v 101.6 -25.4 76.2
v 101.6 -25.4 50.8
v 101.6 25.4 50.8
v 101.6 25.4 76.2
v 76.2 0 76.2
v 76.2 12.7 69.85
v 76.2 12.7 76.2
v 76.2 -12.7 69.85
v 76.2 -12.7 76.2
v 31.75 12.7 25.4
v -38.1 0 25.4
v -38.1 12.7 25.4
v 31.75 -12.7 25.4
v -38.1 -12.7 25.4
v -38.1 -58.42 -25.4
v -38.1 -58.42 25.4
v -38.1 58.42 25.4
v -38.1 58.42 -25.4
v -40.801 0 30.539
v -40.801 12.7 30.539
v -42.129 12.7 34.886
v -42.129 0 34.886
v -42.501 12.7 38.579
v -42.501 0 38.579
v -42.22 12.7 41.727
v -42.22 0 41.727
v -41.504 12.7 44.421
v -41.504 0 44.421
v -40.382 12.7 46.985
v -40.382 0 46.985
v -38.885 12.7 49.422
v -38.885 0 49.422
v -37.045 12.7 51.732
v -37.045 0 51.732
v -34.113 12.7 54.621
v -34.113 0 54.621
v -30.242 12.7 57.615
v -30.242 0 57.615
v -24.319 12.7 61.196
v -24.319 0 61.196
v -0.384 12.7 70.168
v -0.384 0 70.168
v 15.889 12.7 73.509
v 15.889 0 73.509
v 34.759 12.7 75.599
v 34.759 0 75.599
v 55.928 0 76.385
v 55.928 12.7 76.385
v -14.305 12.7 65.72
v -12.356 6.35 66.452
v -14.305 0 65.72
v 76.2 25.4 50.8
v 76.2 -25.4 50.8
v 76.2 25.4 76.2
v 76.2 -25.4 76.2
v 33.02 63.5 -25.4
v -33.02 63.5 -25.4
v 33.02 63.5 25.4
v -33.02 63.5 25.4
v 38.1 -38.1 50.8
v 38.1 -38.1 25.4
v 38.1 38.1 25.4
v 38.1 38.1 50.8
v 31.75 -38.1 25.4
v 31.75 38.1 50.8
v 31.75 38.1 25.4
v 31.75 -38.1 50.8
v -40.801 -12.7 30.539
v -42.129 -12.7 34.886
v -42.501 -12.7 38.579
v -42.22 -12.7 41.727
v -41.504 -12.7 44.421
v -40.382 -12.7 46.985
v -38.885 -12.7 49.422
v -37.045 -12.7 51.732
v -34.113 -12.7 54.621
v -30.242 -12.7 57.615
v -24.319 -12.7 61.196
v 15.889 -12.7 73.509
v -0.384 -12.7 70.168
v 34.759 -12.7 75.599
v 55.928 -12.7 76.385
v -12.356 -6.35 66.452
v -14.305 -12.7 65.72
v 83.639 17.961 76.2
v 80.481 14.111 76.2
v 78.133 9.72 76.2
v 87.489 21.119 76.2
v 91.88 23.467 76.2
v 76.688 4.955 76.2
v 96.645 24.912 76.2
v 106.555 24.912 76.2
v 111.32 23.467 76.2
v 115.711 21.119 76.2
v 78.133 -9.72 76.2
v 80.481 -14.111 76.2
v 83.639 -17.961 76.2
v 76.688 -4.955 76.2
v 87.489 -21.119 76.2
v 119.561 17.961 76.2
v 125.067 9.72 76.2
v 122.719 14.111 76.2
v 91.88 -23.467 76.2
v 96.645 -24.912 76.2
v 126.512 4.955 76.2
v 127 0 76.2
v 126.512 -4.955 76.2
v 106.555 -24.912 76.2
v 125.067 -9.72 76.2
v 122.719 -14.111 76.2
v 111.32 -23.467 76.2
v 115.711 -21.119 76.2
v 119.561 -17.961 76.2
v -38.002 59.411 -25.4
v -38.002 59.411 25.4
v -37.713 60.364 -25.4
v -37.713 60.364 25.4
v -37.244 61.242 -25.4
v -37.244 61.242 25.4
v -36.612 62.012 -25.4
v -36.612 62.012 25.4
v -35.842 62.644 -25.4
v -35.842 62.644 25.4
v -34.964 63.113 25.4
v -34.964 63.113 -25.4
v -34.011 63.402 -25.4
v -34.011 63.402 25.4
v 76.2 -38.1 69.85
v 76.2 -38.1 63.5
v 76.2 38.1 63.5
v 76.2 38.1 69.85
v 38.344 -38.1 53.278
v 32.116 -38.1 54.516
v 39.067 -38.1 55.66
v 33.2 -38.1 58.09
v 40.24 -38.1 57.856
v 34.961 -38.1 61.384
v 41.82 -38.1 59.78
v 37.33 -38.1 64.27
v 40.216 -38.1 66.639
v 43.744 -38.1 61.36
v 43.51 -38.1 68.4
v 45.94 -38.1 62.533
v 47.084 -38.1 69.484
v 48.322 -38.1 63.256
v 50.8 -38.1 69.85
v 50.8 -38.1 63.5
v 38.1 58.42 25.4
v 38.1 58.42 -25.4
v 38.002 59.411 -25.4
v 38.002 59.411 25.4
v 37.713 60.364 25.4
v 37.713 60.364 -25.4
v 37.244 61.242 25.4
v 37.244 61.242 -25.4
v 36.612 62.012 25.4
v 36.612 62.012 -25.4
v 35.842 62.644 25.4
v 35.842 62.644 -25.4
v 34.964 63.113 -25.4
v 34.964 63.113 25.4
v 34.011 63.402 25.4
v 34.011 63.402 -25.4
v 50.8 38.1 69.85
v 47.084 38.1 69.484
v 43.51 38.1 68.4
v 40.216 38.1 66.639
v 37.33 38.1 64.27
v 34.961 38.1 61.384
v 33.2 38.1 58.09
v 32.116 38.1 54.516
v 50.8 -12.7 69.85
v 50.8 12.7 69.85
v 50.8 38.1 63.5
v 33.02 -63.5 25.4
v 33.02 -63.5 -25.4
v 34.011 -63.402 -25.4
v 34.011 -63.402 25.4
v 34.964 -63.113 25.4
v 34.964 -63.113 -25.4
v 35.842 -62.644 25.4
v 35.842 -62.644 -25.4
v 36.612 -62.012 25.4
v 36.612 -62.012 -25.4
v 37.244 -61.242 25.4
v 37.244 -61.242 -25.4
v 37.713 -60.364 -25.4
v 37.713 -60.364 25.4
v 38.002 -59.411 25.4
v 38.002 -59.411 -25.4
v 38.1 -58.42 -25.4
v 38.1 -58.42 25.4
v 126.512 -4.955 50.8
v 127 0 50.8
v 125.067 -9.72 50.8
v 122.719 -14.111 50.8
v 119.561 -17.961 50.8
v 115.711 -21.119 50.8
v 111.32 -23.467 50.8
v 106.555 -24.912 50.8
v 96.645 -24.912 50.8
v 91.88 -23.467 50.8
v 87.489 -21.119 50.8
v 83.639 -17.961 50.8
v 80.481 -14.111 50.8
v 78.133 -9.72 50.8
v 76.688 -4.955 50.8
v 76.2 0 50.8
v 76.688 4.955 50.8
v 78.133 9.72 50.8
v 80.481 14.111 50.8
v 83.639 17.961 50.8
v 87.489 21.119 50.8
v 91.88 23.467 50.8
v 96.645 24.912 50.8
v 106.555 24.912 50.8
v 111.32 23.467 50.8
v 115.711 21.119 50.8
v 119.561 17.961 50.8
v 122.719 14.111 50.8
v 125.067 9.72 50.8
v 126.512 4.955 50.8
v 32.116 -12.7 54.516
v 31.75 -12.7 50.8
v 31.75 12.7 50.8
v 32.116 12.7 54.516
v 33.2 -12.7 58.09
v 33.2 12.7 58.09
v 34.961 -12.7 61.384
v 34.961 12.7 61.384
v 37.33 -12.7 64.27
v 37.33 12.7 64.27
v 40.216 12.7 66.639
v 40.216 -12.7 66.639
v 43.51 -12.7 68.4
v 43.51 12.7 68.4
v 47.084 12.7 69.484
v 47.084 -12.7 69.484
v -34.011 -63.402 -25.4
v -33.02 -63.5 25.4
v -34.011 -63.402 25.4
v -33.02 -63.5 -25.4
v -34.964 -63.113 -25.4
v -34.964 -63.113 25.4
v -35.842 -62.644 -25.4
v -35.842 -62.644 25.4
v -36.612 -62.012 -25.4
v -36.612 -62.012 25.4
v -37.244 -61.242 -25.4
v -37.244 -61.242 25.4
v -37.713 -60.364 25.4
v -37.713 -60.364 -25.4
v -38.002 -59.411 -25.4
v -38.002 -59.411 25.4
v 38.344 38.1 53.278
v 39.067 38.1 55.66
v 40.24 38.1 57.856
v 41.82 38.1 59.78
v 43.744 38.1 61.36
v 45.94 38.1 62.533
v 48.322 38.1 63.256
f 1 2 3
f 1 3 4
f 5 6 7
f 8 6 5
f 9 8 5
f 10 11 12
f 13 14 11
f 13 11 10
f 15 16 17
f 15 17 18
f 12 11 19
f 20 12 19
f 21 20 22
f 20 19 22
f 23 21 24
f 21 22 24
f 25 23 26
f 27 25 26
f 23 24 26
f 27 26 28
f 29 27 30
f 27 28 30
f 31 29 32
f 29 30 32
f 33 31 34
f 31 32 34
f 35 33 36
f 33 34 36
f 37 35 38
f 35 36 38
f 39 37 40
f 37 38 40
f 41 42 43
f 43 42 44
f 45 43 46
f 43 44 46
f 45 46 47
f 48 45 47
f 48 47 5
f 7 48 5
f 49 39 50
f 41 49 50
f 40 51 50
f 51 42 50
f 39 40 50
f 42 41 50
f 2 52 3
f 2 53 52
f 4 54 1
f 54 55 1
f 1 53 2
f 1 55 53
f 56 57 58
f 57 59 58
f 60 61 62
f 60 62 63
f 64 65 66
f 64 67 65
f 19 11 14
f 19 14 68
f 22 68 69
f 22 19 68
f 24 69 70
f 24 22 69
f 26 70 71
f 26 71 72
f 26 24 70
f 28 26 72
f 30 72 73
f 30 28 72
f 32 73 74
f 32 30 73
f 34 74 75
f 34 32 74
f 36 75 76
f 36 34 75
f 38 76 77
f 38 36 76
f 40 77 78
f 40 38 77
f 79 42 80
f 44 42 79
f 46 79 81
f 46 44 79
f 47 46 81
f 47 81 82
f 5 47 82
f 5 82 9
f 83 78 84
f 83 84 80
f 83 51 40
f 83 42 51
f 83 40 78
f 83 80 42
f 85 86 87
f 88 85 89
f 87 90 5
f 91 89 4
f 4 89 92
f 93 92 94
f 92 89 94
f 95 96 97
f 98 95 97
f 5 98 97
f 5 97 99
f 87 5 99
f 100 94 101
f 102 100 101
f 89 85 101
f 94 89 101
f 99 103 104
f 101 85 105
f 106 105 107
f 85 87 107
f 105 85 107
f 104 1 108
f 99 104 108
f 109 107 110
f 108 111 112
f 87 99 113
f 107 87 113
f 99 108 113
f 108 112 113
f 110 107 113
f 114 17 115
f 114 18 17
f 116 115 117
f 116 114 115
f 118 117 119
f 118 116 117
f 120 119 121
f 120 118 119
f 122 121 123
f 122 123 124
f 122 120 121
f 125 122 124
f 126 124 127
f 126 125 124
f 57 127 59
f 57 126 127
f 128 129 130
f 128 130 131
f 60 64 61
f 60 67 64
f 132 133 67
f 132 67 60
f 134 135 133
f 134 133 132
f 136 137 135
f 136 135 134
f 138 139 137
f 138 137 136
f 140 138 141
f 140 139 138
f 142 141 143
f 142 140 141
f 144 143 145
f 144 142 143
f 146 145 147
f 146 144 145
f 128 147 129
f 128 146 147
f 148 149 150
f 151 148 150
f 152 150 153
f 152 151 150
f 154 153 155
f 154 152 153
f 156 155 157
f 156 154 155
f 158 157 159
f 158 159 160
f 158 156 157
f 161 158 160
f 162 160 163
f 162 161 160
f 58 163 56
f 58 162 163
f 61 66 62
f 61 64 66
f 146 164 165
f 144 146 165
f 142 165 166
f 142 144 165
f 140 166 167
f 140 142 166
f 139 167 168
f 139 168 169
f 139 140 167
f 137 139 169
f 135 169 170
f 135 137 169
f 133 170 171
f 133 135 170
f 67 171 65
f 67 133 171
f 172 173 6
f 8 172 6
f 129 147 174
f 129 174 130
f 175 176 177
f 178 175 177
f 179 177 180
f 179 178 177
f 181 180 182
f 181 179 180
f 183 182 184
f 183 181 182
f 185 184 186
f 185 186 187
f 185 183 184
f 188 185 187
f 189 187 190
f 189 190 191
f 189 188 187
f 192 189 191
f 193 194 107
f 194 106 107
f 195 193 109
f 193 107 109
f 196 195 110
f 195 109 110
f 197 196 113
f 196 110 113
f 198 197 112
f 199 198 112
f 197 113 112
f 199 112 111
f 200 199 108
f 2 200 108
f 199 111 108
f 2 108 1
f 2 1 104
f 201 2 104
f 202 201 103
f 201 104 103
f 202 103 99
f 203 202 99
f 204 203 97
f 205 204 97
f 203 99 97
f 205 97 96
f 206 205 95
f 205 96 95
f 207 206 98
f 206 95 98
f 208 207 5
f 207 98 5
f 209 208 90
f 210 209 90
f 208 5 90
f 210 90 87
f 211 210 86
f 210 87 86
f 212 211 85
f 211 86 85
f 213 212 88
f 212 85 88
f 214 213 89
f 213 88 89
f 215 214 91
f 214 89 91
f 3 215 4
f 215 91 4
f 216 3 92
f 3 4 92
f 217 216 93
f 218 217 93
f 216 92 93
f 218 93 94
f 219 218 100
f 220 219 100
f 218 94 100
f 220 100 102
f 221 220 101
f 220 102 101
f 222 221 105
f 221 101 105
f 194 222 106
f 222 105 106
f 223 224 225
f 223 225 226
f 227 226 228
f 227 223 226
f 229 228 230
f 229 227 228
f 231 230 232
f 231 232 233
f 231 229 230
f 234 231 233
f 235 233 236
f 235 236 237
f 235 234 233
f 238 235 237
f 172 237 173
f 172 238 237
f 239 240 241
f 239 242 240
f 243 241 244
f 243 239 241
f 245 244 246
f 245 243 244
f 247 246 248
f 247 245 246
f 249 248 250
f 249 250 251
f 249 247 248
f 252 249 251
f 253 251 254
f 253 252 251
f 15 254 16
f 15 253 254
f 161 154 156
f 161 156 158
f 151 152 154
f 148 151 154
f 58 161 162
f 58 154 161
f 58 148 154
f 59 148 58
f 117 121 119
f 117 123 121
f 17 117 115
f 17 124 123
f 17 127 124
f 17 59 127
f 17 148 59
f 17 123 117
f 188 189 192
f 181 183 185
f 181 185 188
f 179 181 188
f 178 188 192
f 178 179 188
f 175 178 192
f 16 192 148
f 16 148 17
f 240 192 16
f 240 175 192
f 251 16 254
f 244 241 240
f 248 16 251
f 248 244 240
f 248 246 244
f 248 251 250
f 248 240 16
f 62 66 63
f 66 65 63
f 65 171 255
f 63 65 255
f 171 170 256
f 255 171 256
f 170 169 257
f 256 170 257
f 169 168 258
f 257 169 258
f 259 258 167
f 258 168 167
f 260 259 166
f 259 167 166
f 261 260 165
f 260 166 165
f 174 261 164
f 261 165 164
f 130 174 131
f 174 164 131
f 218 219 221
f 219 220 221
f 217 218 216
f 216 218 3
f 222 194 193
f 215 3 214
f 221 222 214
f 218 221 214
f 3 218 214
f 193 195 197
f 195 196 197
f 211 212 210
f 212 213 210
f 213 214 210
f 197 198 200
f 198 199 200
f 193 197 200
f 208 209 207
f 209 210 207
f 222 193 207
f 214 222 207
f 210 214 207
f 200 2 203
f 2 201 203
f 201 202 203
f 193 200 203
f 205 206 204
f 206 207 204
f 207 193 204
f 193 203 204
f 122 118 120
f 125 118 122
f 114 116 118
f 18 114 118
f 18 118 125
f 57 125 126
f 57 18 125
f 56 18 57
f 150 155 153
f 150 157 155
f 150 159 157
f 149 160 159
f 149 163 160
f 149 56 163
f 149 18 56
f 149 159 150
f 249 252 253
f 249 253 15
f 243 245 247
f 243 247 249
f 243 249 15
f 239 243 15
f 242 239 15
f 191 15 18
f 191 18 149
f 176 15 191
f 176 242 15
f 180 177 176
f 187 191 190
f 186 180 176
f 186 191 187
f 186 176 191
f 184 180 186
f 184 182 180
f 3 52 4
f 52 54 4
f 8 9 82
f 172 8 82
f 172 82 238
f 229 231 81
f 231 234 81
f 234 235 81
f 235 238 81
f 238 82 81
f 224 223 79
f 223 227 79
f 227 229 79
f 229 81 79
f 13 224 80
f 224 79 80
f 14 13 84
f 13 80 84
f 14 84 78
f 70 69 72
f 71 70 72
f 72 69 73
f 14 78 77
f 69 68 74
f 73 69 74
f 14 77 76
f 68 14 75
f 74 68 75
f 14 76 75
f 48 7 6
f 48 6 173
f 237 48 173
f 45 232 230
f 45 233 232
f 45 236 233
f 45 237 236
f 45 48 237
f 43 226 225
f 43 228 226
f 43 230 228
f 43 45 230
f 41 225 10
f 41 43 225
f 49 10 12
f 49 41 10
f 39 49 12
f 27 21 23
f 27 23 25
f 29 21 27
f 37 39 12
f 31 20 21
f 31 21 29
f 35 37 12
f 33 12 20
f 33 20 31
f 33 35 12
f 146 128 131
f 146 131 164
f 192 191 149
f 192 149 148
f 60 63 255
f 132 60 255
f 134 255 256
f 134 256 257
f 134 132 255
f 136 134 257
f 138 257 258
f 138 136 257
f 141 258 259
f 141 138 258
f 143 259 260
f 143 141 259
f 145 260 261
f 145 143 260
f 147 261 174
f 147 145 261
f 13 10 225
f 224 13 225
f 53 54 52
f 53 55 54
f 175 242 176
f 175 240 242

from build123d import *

# Parameters (mm, degrees)
F1_DEPTH = 63.5
F0_W     = 25.4
F0_H     = 12.7
F0_H_2   = 6.35
F2_DEPTH = 25.4
F3_DEPTH = 38.1
F4_DEPTH = 12.7
F6_R     = 5.08
F7_R     = 5.08
F8_R     = 5.08


with BuildPart() as f1:
    # F0 (on Front) → F1 (new body, symmetric)
    with BuildSketch(Plane.XZ):
        Polygon((-38.1, -25.4), (38.1, -25.4), (38.1, 25.4), (31.75, 25.4), (-38.1, 25.4), align=None)
    extrude(amount=F1_DEPTH, both=True)

    # F6
    f6_edges = [f1.edges().sort_by_distance(p)[0] for p in [
        (38.1, -63.5, 0),
    ]]
    fillet(f6_edges, radius=F6_R)

    # F7
    f7_edges = [f1.edges().sort_by_distance(p)[0] for p in [
        (-38.1, -63.5, 0),
    ]]
    fillet(f7_edges, radius=F7_R)

    # F8
    f8_edges = [f1.edges().sort_by_distance(p)[0] for p in [
        (-38.1, 63.5, 0),
        (38.1, 63.5, 0),
    ]]
    fillet(f8_edges, radius=F8_R)


with BuildPart() as f2:
    # F0 (on Front) → F2 (new body, symmetric)
    with BuildSketch(Plane.XZ):
        with Locations((88.9, 57.15)):
            Rectangle(F0_W, F0_H)
        with Locations((88.9, 66.675)):
            Rectangle(F0_W, F0_H_2)
        with Locations((88.9, 73.025)):
            Rectangle(F0_W, F0_H_2)
    extrude(amount=F2_DEPTH, both=True)


with BuildPart() as f3:
    # F0 (on Front) → F3 (new body, symmetric)
    with BuildSketch(Plane.XZ):
        with BuildLine():
            Line((31.75, 25.4), (38.1, 25.4))
            Line((38.1, 25.4), (38.1, 50.8))
            ThreePointArc((38.1, 50.8), (41.8197438789, 59.7802561211), (50.8, 63.5))
            Line((50.8, 63.5), (76.2, 63.5))
            Line((76.2, 63.5), (76.2, 69.85))
            Line((76.2, 69.85), (50.8, 69.85))
            ThreePointArc((50.8, 69.85), (37.3296158184, 64.2703841816), (31.75, 50.8))
            Line((31.75, 50.8), (31.75, 25.4))
        make_face()
    extrude(amount=F3_DEPTH, both=True)


with BuildPart() as f4:
    # F0 (on Front) → F4 (new body, symmetric)
    with BuildSketch(Plane.XZ):
        with BuildLine():
            add(Edge.make_bspline(
                [(-38.1, 25.4), (-51.135007292, 45.8500422537), (-8.4800277474, 76.6009273388), (48.4329954615, 76.8052207334), (76.2, 76.2)],
                knots=[0, 0, 0, 0, 0.4244585088, 1, 1, 1, 1], degree=3))
            Line((-38.1, 25.4), (31.75, 25.4))
            Line((31.75, 25.4), (31.75, 50.8))
            ThreePointArc((31.75, 50.8), (37.3296158184, 64.2703841816), (50.8, 69.85))
            Line((50.8, 69.85), (76.2, 69.85))
            Line((76.2, 69.85), (76.2, 76.2))
        make_face()
    extrude(amount=F4_DEPTH, both=True)


with BuildPart() as f5:
    # F0 (on Front) → F5 (revolve)
    with BuildSketch(Plane.XZ):
        Polygon((127, 76.2), (101.6, 76.2), (101.6, 69.85), (101.6, 63.5), (101.6, 50.8), (127, 50.8), align=None)
    revolve(axis=Axis((101.6, 0, 57.15), (0, 0, -1)))


solid = Compound([f1.part, f2.part, f3.part, f4.part, f5.part])
